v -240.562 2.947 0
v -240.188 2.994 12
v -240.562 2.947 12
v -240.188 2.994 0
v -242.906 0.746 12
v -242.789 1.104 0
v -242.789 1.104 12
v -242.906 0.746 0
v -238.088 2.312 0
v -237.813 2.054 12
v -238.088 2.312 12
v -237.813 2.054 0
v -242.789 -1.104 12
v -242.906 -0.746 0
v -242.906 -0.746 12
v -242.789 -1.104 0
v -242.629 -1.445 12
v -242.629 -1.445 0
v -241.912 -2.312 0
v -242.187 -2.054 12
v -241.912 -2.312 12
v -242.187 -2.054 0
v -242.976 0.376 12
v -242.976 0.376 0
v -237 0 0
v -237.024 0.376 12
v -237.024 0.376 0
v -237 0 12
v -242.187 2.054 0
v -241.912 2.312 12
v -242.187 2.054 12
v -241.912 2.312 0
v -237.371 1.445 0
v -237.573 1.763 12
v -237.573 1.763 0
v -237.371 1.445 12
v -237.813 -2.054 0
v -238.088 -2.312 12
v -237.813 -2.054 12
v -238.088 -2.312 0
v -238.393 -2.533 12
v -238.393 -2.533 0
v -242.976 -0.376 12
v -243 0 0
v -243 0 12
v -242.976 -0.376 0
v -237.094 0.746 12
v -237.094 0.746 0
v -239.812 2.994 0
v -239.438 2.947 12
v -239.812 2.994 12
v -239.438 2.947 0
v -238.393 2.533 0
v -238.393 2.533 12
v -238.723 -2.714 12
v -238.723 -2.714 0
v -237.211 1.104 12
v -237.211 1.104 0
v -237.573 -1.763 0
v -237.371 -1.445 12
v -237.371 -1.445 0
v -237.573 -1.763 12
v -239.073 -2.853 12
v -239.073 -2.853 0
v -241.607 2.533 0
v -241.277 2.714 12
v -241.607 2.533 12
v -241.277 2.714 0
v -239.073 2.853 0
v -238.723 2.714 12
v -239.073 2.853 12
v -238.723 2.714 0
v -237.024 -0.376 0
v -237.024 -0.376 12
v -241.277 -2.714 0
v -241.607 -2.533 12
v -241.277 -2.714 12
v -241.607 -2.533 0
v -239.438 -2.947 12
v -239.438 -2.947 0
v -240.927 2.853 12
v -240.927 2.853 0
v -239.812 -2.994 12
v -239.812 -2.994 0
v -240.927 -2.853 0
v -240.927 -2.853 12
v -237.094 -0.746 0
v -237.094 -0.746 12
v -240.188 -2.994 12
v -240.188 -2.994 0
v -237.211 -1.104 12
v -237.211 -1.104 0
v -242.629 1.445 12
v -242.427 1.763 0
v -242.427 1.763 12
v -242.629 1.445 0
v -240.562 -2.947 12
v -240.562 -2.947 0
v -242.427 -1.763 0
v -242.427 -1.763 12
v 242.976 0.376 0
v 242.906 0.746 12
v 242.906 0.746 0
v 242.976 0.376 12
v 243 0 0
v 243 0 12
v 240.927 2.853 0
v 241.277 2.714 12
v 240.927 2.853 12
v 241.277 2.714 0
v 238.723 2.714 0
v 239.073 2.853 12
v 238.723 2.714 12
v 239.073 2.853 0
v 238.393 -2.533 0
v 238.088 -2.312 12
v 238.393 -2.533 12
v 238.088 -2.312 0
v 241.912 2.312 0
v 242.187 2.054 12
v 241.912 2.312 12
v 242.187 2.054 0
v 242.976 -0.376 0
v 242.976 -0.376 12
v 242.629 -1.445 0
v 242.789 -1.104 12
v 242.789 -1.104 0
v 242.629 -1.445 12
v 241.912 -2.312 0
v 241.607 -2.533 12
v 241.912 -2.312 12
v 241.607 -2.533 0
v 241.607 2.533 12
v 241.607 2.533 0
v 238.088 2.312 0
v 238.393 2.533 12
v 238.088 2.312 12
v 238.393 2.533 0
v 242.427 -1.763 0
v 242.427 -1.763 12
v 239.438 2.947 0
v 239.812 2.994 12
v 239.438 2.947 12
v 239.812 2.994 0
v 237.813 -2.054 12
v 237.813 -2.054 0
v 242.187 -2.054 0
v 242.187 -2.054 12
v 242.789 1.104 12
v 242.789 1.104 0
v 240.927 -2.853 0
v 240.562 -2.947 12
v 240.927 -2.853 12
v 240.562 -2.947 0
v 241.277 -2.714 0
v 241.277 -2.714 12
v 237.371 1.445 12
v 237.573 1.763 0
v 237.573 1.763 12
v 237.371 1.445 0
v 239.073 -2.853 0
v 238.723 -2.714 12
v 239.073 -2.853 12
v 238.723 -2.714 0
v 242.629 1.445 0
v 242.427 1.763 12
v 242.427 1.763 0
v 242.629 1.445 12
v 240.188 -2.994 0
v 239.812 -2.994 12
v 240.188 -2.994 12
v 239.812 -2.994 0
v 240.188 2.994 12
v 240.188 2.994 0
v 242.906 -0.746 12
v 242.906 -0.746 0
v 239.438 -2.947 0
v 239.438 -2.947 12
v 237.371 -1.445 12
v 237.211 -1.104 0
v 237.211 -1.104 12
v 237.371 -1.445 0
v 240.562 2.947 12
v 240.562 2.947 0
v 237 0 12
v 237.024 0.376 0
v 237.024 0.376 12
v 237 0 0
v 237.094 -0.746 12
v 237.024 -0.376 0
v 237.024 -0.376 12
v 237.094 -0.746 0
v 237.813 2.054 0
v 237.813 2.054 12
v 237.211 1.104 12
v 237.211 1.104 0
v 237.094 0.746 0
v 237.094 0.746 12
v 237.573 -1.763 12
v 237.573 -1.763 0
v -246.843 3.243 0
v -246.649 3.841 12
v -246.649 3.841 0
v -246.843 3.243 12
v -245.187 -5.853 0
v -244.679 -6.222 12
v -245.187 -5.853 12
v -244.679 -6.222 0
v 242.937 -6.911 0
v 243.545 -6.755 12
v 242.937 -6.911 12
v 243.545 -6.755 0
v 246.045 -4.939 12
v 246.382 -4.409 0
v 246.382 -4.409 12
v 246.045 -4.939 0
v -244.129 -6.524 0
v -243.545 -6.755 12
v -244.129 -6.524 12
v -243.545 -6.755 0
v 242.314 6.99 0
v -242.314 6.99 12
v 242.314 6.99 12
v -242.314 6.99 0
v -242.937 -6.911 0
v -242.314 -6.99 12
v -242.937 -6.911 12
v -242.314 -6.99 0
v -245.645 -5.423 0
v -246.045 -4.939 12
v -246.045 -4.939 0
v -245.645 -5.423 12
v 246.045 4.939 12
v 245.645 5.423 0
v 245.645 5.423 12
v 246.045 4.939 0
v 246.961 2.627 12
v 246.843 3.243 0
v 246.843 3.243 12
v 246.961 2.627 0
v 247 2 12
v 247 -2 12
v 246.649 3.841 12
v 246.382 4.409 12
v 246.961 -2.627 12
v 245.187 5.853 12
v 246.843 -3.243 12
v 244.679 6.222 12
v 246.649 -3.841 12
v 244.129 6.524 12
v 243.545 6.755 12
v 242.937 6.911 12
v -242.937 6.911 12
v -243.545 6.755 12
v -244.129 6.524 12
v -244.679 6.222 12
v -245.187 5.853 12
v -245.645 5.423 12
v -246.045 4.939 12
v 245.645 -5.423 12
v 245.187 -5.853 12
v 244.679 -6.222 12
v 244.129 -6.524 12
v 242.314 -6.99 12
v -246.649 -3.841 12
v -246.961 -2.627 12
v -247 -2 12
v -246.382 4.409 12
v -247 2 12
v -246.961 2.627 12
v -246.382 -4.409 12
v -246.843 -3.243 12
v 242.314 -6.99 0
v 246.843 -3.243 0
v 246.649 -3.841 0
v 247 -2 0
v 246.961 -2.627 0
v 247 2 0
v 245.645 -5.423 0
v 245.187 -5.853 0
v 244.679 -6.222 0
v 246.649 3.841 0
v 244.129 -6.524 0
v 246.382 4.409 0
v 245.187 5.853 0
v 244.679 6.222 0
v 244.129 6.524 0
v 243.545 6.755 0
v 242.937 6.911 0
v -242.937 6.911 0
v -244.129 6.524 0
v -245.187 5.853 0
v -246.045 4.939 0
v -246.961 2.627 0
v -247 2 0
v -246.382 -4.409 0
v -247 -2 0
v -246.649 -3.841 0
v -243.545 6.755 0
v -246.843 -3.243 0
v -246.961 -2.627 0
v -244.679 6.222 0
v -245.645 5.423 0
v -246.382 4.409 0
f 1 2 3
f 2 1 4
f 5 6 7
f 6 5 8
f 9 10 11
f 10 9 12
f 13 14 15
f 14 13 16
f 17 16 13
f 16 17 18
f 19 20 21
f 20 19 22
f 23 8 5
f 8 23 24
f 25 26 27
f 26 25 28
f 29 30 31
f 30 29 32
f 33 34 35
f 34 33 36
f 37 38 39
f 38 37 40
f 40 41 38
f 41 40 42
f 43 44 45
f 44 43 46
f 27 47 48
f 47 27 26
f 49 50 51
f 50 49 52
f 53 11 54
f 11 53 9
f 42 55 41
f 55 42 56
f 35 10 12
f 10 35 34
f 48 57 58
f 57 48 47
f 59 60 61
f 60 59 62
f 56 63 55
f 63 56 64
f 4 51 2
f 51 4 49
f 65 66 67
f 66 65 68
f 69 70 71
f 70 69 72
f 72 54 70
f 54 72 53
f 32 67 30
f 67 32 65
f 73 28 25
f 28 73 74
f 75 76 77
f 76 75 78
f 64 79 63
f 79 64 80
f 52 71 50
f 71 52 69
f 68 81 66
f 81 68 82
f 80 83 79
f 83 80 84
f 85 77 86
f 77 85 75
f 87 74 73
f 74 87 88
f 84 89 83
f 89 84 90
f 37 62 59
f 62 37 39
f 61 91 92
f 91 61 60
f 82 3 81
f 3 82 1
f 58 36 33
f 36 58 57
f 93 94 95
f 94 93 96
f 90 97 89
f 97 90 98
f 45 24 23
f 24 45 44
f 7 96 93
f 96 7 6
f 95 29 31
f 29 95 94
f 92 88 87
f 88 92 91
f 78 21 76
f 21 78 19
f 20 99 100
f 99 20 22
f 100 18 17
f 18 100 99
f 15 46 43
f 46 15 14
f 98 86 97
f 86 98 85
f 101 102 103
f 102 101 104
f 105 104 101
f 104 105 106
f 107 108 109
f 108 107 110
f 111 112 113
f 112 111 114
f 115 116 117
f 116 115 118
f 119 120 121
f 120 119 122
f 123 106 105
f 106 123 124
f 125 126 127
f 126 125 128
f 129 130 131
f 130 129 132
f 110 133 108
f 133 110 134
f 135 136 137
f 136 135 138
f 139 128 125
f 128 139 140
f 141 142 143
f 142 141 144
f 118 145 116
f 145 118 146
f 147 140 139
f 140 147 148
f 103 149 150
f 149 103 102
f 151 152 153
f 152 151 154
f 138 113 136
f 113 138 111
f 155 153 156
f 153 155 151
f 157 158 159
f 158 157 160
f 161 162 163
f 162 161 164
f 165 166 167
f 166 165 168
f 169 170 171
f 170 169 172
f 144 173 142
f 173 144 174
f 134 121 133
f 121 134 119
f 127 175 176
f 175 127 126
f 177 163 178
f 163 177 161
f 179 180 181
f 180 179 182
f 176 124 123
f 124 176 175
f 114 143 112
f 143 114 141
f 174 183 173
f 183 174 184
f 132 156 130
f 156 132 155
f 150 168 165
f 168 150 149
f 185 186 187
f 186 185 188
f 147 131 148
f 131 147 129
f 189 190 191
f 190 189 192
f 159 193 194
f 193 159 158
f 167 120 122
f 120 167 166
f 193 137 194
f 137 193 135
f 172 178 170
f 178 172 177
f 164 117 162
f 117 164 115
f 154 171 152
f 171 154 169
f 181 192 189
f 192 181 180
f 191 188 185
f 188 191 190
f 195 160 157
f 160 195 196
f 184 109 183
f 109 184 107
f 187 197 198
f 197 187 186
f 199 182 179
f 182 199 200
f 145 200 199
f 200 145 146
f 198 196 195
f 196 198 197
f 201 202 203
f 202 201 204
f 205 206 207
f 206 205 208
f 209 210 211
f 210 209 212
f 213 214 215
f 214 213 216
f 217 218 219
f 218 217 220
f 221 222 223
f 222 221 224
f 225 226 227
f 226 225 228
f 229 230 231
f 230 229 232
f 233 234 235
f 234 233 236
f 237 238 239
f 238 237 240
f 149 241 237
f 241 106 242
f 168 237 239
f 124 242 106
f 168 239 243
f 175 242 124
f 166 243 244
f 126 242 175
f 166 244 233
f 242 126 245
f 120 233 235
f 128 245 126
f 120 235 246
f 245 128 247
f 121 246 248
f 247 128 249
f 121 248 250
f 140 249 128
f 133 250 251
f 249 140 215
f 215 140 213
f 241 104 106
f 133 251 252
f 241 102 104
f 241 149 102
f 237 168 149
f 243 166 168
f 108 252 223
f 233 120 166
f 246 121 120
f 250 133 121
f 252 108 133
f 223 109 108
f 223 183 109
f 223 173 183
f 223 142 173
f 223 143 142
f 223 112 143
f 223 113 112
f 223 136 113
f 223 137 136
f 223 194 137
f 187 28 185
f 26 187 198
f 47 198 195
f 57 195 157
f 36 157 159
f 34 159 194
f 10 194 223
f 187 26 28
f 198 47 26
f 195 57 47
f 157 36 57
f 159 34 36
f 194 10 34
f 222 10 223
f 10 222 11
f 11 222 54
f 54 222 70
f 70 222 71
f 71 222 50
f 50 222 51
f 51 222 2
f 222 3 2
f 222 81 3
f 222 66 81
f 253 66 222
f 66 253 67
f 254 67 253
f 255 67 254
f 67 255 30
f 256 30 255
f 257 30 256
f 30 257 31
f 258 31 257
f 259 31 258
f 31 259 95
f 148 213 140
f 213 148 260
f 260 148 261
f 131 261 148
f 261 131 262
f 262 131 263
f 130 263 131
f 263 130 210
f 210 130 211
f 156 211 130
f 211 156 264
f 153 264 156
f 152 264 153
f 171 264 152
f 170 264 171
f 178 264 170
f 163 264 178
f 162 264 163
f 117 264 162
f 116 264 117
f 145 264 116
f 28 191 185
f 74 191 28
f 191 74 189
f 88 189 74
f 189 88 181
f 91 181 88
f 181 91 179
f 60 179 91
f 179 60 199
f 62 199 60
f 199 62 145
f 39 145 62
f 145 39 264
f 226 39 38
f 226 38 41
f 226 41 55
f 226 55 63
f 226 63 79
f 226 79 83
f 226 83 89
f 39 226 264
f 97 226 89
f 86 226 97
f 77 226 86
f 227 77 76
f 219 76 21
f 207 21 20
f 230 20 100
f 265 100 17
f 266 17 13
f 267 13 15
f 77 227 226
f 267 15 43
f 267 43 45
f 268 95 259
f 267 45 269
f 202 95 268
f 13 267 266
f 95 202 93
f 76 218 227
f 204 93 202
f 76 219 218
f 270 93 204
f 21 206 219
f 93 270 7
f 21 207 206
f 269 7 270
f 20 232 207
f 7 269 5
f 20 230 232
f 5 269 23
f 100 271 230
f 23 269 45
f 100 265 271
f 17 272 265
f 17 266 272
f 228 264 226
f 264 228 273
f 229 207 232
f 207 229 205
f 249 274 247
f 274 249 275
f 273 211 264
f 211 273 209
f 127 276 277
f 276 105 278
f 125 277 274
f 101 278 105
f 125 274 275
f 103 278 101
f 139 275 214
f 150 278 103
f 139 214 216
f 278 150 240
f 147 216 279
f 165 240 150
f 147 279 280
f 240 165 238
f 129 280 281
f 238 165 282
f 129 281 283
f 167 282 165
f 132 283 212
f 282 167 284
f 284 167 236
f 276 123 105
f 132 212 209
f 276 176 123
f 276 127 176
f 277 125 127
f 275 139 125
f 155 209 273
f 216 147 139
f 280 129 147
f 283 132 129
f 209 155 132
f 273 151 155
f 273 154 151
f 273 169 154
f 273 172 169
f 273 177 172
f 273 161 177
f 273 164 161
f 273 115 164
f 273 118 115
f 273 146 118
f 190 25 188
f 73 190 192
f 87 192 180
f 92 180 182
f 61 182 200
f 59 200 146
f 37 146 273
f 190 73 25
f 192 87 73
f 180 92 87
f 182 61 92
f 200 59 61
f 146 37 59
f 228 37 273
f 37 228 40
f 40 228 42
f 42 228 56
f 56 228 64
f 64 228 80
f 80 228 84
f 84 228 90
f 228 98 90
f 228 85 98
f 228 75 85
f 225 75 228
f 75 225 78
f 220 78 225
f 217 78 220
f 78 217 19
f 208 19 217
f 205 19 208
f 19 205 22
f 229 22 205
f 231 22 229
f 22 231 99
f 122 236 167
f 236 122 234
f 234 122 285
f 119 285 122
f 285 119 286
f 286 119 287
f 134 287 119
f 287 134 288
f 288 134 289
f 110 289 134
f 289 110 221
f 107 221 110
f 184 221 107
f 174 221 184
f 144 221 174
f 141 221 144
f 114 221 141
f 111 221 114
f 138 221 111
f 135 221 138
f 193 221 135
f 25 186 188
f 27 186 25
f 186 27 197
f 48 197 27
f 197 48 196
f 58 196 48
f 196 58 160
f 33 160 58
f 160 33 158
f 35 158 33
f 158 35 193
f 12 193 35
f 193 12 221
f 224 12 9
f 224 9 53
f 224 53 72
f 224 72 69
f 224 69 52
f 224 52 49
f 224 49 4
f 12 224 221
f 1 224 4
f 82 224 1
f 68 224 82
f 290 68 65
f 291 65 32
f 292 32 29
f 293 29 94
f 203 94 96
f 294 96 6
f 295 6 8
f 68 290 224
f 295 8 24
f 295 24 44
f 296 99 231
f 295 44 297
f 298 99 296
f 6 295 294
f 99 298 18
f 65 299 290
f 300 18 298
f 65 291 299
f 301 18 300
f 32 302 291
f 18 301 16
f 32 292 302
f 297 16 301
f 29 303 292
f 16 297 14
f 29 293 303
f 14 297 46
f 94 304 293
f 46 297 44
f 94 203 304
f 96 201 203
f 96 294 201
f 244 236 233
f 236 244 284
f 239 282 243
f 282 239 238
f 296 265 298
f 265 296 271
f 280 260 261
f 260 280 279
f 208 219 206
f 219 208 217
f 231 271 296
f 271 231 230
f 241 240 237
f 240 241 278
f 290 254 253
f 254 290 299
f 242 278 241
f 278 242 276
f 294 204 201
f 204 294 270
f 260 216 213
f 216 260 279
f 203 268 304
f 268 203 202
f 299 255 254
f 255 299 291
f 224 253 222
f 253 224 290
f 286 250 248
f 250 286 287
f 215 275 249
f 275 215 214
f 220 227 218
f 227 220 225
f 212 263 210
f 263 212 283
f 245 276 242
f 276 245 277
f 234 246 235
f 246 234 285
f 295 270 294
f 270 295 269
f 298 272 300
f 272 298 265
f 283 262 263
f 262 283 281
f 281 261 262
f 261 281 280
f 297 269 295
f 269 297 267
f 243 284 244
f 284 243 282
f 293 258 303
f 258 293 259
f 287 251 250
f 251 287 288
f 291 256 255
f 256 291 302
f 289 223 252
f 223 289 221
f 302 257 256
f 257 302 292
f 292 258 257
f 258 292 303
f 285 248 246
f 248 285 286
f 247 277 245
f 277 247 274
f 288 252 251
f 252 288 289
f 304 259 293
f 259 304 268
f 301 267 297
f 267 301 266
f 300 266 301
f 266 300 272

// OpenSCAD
$fn = 50;


difference() {
	union() {
		hull() {
			translate(v = [-242.0000000000, 2.0000000000, 0]) {
				cylinder(h = 12, r = 5);
			}
			translate(v = [242.0000000000, 2.0000000000, 0]) {
				cylinder(h = 12, r = 5);
			}
			translate(v = [-242.0000000000, -2.0000000000, 0]) {
				cylinder(h = 12, r = 5);
			}
			translate(v = [242.0000000000, -2.0000000000, 0]) {
				cylinder(h = 12, r = 5);
			}
		}
	}
	union() {
		translate(v = [-240.0000000000, 0.0000000000, -100.0000000000]) {
			cylinder(h = 200, r = 3.0000000000);
		}
		translate(v = [-240.0000000000, 0.0000000000, -100.0000000000]) {
			cylinder(h = 200, r = 3.0000000000);
		}
		translate(v = [240.0000000000, 0.0000000000, -100.0000000000]) {
			cylinder(h = 200, r = 3.0000000000);
		}
		translate(v = [240.0000000000, 0.0000000000, -100.0000000000]) {
			cylinder(h = 200, r = 3.0000000000);
		}
	}
}
